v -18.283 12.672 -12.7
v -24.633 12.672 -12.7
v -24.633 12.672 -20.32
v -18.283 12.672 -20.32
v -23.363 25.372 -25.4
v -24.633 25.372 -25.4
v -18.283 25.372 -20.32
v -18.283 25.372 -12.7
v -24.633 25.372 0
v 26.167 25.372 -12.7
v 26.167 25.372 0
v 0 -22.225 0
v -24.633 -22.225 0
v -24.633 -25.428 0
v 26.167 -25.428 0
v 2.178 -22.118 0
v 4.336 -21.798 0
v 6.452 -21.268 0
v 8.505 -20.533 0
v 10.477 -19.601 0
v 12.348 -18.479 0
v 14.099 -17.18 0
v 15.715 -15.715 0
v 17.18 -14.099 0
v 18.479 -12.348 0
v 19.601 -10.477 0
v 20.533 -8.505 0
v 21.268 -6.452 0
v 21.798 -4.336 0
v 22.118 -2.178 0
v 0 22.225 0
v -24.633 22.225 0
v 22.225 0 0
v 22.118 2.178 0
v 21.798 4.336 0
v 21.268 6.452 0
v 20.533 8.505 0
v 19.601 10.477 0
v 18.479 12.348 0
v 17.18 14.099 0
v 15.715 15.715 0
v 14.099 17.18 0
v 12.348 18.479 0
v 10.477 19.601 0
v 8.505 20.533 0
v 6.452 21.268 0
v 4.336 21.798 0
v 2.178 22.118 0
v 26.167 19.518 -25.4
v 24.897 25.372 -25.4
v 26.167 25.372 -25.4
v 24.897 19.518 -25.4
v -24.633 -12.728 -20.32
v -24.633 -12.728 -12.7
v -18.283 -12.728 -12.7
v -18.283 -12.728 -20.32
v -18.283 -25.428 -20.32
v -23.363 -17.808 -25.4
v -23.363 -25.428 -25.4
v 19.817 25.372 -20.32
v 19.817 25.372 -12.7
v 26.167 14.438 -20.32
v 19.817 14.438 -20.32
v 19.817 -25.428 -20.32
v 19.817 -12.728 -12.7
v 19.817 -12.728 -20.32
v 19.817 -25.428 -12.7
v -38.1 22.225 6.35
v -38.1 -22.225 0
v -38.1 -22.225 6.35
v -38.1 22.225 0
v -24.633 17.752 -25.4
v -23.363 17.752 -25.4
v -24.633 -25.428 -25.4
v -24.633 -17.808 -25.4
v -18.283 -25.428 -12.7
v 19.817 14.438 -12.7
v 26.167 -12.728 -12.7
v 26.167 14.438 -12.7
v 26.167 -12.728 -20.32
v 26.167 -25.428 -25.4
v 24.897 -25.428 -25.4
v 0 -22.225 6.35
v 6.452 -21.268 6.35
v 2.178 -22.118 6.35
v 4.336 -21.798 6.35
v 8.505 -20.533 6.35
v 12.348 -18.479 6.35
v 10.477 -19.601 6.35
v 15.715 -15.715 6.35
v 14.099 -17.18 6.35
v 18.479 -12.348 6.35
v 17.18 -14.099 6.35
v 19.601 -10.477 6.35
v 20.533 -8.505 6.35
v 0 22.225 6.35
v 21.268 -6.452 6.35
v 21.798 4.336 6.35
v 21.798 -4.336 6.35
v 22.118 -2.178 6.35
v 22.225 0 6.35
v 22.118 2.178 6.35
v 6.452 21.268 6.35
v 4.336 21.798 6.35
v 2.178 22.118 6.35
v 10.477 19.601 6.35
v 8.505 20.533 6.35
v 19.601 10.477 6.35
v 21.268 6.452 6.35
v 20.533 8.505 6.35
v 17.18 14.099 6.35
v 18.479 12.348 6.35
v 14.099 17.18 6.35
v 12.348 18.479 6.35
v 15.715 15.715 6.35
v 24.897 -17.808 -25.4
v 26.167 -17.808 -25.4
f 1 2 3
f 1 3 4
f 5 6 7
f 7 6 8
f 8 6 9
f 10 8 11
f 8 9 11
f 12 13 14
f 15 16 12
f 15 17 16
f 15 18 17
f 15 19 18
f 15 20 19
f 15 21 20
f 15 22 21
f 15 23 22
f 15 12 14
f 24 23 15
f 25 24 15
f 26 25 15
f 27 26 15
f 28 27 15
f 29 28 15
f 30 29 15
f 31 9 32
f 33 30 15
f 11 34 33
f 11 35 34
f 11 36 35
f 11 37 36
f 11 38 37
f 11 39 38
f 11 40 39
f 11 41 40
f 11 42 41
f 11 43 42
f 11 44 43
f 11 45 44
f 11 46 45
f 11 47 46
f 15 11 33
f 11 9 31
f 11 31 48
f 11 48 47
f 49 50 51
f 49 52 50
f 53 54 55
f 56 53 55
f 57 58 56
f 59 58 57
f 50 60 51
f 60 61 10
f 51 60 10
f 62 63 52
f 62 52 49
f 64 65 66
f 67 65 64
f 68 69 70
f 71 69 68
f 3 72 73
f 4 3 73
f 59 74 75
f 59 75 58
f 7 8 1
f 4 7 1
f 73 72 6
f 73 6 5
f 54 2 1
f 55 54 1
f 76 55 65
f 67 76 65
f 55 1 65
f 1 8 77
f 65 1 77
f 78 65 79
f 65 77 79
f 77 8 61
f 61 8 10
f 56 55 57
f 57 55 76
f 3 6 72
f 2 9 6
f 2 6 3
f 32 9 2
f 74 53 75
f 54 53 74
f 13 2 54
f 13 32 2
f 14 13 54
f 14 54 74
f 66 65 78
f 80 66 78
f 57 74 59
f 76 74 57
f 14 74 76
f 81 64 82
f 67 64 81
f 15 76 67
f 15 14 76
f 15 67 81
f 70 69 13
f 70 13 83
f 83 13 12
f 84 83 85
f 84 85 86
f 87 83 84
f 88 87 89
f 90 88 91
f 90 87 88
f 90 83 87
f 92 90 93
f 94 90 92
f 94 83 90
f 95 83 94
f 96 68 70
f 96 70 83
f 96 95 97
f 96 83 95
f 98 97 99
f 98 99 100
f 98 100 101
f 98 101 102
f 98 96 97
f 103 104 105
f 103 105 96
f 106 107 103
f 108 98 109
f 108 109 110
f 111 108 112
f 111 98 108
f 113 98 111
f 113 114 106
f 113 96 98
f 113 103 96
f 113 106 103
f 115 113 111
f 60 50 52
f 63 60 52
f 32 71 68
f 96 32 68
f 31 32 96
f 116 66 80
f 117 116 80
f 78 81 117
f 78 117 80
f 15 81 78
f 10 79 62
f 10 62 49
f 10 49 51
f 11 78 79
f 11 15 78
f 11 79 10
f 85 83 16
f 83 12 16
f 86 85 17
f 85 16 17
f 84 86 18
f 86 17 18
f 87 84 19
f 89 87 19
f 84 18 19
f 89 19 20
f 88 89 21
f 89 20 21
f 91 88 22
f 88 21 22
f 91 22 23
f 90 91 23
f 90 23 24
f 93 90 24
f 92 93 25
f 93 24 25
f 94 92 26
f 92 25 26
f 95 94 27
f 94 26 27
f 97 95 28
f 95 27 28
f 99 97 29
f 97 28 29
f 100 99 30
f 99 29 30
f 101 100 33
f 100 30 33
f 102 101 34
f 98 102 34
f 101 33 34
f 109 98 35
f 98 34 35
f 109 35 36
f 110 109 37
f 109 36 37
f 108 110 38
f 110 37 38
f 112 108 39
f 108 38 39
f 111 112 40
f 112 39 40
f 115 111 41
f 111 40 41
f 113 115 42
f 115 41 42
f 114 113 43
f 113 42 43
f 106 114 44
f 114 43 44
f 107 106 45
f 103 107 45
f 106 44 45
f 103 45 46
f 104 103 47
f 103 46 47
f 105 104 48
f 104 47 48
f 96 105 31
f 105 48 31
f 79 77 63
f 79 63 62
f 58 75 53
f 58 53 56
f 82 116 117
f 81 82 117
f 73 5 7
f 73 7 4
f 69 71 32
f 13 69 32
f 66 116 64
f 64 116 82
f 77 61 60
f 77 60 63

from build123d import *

# Parameters (mm, degrees)
F0_W     = 50.8
F0_H     = 50.8
F1_DEPTH = 12.7
F2_W     = 6.35
F2_H     = 12.7
F2_H_2   = 10.934927
F3_DEPTH = 12.7
F4_SIZE  = 5.08
F5_R     = 22.225
F6_DEPTH = 6.35
F7_W     = 38.1
F7_H     = 44.45
F8_DEPTH = 6.35


with BuildPart() as f1:
    # F0 (on Top) → F1 (new body)
    with BuildSketch(Plane.XY):
        with Locations((0.767379, -0.027555)):
            Rectangle(F0_W, F0_H)
    extrude(amount=-F1_DEPTH)

    # F2 (on face) → F3 (join)
    with BuildSketch(Plane(origin=(0, 0, -12.7), x_dir=(1, 0, 0), z_dir=(0, 0, -1))):
        with Locations((-21.457621, 19.077555)):
            Rectangle(F2_W, F2_H)
        with Locations((22.992379, 19.077555)):
            Rectangle(F2_W, F2_H)
        with Locations((-21.457621, -19.022445)):
            Rectangle(F2_W, F2_H)
        with Locations((22.992379, -19.904981)):
            Rectangle(F2_W, F2_H_2)
    extrude(amount=F3_DEPTH)

    # F4
    f4_edges = [f1.edges().sort_by_distance(p)[0] for p in [
        (-21.457621, -12.727555, -25.4),
        (-18.282621, -19.077555, -25.4),
        (19.817379, -19.077555, -25.4),
        (22.992379, -12.727555, -25.4),
        (-18.282621, 19.022445, -25.4),
        (-21.457621, 12.672445, -25.4),
        (22.992379, 14.437518, -25.4),
        (19.817379, 19.904981, -25.4),
    ]]
    chamfer(f4_edges, length=F4_SIZE)

    # F5 (on face) → F6 (join)
    with BuildSketch(Plane.XY):
        Circle(F5_R)
    extrude(amount=F6_DEPTH)

    # F7 (on face) → F8 (join)
    with BuildSketch(Plane.XY):
        with Locations((-19.05, 0)):
            Rectangle(F7_W, F7_H)
    extrude(amount=F8_DEPTH)


solid = f1.part
